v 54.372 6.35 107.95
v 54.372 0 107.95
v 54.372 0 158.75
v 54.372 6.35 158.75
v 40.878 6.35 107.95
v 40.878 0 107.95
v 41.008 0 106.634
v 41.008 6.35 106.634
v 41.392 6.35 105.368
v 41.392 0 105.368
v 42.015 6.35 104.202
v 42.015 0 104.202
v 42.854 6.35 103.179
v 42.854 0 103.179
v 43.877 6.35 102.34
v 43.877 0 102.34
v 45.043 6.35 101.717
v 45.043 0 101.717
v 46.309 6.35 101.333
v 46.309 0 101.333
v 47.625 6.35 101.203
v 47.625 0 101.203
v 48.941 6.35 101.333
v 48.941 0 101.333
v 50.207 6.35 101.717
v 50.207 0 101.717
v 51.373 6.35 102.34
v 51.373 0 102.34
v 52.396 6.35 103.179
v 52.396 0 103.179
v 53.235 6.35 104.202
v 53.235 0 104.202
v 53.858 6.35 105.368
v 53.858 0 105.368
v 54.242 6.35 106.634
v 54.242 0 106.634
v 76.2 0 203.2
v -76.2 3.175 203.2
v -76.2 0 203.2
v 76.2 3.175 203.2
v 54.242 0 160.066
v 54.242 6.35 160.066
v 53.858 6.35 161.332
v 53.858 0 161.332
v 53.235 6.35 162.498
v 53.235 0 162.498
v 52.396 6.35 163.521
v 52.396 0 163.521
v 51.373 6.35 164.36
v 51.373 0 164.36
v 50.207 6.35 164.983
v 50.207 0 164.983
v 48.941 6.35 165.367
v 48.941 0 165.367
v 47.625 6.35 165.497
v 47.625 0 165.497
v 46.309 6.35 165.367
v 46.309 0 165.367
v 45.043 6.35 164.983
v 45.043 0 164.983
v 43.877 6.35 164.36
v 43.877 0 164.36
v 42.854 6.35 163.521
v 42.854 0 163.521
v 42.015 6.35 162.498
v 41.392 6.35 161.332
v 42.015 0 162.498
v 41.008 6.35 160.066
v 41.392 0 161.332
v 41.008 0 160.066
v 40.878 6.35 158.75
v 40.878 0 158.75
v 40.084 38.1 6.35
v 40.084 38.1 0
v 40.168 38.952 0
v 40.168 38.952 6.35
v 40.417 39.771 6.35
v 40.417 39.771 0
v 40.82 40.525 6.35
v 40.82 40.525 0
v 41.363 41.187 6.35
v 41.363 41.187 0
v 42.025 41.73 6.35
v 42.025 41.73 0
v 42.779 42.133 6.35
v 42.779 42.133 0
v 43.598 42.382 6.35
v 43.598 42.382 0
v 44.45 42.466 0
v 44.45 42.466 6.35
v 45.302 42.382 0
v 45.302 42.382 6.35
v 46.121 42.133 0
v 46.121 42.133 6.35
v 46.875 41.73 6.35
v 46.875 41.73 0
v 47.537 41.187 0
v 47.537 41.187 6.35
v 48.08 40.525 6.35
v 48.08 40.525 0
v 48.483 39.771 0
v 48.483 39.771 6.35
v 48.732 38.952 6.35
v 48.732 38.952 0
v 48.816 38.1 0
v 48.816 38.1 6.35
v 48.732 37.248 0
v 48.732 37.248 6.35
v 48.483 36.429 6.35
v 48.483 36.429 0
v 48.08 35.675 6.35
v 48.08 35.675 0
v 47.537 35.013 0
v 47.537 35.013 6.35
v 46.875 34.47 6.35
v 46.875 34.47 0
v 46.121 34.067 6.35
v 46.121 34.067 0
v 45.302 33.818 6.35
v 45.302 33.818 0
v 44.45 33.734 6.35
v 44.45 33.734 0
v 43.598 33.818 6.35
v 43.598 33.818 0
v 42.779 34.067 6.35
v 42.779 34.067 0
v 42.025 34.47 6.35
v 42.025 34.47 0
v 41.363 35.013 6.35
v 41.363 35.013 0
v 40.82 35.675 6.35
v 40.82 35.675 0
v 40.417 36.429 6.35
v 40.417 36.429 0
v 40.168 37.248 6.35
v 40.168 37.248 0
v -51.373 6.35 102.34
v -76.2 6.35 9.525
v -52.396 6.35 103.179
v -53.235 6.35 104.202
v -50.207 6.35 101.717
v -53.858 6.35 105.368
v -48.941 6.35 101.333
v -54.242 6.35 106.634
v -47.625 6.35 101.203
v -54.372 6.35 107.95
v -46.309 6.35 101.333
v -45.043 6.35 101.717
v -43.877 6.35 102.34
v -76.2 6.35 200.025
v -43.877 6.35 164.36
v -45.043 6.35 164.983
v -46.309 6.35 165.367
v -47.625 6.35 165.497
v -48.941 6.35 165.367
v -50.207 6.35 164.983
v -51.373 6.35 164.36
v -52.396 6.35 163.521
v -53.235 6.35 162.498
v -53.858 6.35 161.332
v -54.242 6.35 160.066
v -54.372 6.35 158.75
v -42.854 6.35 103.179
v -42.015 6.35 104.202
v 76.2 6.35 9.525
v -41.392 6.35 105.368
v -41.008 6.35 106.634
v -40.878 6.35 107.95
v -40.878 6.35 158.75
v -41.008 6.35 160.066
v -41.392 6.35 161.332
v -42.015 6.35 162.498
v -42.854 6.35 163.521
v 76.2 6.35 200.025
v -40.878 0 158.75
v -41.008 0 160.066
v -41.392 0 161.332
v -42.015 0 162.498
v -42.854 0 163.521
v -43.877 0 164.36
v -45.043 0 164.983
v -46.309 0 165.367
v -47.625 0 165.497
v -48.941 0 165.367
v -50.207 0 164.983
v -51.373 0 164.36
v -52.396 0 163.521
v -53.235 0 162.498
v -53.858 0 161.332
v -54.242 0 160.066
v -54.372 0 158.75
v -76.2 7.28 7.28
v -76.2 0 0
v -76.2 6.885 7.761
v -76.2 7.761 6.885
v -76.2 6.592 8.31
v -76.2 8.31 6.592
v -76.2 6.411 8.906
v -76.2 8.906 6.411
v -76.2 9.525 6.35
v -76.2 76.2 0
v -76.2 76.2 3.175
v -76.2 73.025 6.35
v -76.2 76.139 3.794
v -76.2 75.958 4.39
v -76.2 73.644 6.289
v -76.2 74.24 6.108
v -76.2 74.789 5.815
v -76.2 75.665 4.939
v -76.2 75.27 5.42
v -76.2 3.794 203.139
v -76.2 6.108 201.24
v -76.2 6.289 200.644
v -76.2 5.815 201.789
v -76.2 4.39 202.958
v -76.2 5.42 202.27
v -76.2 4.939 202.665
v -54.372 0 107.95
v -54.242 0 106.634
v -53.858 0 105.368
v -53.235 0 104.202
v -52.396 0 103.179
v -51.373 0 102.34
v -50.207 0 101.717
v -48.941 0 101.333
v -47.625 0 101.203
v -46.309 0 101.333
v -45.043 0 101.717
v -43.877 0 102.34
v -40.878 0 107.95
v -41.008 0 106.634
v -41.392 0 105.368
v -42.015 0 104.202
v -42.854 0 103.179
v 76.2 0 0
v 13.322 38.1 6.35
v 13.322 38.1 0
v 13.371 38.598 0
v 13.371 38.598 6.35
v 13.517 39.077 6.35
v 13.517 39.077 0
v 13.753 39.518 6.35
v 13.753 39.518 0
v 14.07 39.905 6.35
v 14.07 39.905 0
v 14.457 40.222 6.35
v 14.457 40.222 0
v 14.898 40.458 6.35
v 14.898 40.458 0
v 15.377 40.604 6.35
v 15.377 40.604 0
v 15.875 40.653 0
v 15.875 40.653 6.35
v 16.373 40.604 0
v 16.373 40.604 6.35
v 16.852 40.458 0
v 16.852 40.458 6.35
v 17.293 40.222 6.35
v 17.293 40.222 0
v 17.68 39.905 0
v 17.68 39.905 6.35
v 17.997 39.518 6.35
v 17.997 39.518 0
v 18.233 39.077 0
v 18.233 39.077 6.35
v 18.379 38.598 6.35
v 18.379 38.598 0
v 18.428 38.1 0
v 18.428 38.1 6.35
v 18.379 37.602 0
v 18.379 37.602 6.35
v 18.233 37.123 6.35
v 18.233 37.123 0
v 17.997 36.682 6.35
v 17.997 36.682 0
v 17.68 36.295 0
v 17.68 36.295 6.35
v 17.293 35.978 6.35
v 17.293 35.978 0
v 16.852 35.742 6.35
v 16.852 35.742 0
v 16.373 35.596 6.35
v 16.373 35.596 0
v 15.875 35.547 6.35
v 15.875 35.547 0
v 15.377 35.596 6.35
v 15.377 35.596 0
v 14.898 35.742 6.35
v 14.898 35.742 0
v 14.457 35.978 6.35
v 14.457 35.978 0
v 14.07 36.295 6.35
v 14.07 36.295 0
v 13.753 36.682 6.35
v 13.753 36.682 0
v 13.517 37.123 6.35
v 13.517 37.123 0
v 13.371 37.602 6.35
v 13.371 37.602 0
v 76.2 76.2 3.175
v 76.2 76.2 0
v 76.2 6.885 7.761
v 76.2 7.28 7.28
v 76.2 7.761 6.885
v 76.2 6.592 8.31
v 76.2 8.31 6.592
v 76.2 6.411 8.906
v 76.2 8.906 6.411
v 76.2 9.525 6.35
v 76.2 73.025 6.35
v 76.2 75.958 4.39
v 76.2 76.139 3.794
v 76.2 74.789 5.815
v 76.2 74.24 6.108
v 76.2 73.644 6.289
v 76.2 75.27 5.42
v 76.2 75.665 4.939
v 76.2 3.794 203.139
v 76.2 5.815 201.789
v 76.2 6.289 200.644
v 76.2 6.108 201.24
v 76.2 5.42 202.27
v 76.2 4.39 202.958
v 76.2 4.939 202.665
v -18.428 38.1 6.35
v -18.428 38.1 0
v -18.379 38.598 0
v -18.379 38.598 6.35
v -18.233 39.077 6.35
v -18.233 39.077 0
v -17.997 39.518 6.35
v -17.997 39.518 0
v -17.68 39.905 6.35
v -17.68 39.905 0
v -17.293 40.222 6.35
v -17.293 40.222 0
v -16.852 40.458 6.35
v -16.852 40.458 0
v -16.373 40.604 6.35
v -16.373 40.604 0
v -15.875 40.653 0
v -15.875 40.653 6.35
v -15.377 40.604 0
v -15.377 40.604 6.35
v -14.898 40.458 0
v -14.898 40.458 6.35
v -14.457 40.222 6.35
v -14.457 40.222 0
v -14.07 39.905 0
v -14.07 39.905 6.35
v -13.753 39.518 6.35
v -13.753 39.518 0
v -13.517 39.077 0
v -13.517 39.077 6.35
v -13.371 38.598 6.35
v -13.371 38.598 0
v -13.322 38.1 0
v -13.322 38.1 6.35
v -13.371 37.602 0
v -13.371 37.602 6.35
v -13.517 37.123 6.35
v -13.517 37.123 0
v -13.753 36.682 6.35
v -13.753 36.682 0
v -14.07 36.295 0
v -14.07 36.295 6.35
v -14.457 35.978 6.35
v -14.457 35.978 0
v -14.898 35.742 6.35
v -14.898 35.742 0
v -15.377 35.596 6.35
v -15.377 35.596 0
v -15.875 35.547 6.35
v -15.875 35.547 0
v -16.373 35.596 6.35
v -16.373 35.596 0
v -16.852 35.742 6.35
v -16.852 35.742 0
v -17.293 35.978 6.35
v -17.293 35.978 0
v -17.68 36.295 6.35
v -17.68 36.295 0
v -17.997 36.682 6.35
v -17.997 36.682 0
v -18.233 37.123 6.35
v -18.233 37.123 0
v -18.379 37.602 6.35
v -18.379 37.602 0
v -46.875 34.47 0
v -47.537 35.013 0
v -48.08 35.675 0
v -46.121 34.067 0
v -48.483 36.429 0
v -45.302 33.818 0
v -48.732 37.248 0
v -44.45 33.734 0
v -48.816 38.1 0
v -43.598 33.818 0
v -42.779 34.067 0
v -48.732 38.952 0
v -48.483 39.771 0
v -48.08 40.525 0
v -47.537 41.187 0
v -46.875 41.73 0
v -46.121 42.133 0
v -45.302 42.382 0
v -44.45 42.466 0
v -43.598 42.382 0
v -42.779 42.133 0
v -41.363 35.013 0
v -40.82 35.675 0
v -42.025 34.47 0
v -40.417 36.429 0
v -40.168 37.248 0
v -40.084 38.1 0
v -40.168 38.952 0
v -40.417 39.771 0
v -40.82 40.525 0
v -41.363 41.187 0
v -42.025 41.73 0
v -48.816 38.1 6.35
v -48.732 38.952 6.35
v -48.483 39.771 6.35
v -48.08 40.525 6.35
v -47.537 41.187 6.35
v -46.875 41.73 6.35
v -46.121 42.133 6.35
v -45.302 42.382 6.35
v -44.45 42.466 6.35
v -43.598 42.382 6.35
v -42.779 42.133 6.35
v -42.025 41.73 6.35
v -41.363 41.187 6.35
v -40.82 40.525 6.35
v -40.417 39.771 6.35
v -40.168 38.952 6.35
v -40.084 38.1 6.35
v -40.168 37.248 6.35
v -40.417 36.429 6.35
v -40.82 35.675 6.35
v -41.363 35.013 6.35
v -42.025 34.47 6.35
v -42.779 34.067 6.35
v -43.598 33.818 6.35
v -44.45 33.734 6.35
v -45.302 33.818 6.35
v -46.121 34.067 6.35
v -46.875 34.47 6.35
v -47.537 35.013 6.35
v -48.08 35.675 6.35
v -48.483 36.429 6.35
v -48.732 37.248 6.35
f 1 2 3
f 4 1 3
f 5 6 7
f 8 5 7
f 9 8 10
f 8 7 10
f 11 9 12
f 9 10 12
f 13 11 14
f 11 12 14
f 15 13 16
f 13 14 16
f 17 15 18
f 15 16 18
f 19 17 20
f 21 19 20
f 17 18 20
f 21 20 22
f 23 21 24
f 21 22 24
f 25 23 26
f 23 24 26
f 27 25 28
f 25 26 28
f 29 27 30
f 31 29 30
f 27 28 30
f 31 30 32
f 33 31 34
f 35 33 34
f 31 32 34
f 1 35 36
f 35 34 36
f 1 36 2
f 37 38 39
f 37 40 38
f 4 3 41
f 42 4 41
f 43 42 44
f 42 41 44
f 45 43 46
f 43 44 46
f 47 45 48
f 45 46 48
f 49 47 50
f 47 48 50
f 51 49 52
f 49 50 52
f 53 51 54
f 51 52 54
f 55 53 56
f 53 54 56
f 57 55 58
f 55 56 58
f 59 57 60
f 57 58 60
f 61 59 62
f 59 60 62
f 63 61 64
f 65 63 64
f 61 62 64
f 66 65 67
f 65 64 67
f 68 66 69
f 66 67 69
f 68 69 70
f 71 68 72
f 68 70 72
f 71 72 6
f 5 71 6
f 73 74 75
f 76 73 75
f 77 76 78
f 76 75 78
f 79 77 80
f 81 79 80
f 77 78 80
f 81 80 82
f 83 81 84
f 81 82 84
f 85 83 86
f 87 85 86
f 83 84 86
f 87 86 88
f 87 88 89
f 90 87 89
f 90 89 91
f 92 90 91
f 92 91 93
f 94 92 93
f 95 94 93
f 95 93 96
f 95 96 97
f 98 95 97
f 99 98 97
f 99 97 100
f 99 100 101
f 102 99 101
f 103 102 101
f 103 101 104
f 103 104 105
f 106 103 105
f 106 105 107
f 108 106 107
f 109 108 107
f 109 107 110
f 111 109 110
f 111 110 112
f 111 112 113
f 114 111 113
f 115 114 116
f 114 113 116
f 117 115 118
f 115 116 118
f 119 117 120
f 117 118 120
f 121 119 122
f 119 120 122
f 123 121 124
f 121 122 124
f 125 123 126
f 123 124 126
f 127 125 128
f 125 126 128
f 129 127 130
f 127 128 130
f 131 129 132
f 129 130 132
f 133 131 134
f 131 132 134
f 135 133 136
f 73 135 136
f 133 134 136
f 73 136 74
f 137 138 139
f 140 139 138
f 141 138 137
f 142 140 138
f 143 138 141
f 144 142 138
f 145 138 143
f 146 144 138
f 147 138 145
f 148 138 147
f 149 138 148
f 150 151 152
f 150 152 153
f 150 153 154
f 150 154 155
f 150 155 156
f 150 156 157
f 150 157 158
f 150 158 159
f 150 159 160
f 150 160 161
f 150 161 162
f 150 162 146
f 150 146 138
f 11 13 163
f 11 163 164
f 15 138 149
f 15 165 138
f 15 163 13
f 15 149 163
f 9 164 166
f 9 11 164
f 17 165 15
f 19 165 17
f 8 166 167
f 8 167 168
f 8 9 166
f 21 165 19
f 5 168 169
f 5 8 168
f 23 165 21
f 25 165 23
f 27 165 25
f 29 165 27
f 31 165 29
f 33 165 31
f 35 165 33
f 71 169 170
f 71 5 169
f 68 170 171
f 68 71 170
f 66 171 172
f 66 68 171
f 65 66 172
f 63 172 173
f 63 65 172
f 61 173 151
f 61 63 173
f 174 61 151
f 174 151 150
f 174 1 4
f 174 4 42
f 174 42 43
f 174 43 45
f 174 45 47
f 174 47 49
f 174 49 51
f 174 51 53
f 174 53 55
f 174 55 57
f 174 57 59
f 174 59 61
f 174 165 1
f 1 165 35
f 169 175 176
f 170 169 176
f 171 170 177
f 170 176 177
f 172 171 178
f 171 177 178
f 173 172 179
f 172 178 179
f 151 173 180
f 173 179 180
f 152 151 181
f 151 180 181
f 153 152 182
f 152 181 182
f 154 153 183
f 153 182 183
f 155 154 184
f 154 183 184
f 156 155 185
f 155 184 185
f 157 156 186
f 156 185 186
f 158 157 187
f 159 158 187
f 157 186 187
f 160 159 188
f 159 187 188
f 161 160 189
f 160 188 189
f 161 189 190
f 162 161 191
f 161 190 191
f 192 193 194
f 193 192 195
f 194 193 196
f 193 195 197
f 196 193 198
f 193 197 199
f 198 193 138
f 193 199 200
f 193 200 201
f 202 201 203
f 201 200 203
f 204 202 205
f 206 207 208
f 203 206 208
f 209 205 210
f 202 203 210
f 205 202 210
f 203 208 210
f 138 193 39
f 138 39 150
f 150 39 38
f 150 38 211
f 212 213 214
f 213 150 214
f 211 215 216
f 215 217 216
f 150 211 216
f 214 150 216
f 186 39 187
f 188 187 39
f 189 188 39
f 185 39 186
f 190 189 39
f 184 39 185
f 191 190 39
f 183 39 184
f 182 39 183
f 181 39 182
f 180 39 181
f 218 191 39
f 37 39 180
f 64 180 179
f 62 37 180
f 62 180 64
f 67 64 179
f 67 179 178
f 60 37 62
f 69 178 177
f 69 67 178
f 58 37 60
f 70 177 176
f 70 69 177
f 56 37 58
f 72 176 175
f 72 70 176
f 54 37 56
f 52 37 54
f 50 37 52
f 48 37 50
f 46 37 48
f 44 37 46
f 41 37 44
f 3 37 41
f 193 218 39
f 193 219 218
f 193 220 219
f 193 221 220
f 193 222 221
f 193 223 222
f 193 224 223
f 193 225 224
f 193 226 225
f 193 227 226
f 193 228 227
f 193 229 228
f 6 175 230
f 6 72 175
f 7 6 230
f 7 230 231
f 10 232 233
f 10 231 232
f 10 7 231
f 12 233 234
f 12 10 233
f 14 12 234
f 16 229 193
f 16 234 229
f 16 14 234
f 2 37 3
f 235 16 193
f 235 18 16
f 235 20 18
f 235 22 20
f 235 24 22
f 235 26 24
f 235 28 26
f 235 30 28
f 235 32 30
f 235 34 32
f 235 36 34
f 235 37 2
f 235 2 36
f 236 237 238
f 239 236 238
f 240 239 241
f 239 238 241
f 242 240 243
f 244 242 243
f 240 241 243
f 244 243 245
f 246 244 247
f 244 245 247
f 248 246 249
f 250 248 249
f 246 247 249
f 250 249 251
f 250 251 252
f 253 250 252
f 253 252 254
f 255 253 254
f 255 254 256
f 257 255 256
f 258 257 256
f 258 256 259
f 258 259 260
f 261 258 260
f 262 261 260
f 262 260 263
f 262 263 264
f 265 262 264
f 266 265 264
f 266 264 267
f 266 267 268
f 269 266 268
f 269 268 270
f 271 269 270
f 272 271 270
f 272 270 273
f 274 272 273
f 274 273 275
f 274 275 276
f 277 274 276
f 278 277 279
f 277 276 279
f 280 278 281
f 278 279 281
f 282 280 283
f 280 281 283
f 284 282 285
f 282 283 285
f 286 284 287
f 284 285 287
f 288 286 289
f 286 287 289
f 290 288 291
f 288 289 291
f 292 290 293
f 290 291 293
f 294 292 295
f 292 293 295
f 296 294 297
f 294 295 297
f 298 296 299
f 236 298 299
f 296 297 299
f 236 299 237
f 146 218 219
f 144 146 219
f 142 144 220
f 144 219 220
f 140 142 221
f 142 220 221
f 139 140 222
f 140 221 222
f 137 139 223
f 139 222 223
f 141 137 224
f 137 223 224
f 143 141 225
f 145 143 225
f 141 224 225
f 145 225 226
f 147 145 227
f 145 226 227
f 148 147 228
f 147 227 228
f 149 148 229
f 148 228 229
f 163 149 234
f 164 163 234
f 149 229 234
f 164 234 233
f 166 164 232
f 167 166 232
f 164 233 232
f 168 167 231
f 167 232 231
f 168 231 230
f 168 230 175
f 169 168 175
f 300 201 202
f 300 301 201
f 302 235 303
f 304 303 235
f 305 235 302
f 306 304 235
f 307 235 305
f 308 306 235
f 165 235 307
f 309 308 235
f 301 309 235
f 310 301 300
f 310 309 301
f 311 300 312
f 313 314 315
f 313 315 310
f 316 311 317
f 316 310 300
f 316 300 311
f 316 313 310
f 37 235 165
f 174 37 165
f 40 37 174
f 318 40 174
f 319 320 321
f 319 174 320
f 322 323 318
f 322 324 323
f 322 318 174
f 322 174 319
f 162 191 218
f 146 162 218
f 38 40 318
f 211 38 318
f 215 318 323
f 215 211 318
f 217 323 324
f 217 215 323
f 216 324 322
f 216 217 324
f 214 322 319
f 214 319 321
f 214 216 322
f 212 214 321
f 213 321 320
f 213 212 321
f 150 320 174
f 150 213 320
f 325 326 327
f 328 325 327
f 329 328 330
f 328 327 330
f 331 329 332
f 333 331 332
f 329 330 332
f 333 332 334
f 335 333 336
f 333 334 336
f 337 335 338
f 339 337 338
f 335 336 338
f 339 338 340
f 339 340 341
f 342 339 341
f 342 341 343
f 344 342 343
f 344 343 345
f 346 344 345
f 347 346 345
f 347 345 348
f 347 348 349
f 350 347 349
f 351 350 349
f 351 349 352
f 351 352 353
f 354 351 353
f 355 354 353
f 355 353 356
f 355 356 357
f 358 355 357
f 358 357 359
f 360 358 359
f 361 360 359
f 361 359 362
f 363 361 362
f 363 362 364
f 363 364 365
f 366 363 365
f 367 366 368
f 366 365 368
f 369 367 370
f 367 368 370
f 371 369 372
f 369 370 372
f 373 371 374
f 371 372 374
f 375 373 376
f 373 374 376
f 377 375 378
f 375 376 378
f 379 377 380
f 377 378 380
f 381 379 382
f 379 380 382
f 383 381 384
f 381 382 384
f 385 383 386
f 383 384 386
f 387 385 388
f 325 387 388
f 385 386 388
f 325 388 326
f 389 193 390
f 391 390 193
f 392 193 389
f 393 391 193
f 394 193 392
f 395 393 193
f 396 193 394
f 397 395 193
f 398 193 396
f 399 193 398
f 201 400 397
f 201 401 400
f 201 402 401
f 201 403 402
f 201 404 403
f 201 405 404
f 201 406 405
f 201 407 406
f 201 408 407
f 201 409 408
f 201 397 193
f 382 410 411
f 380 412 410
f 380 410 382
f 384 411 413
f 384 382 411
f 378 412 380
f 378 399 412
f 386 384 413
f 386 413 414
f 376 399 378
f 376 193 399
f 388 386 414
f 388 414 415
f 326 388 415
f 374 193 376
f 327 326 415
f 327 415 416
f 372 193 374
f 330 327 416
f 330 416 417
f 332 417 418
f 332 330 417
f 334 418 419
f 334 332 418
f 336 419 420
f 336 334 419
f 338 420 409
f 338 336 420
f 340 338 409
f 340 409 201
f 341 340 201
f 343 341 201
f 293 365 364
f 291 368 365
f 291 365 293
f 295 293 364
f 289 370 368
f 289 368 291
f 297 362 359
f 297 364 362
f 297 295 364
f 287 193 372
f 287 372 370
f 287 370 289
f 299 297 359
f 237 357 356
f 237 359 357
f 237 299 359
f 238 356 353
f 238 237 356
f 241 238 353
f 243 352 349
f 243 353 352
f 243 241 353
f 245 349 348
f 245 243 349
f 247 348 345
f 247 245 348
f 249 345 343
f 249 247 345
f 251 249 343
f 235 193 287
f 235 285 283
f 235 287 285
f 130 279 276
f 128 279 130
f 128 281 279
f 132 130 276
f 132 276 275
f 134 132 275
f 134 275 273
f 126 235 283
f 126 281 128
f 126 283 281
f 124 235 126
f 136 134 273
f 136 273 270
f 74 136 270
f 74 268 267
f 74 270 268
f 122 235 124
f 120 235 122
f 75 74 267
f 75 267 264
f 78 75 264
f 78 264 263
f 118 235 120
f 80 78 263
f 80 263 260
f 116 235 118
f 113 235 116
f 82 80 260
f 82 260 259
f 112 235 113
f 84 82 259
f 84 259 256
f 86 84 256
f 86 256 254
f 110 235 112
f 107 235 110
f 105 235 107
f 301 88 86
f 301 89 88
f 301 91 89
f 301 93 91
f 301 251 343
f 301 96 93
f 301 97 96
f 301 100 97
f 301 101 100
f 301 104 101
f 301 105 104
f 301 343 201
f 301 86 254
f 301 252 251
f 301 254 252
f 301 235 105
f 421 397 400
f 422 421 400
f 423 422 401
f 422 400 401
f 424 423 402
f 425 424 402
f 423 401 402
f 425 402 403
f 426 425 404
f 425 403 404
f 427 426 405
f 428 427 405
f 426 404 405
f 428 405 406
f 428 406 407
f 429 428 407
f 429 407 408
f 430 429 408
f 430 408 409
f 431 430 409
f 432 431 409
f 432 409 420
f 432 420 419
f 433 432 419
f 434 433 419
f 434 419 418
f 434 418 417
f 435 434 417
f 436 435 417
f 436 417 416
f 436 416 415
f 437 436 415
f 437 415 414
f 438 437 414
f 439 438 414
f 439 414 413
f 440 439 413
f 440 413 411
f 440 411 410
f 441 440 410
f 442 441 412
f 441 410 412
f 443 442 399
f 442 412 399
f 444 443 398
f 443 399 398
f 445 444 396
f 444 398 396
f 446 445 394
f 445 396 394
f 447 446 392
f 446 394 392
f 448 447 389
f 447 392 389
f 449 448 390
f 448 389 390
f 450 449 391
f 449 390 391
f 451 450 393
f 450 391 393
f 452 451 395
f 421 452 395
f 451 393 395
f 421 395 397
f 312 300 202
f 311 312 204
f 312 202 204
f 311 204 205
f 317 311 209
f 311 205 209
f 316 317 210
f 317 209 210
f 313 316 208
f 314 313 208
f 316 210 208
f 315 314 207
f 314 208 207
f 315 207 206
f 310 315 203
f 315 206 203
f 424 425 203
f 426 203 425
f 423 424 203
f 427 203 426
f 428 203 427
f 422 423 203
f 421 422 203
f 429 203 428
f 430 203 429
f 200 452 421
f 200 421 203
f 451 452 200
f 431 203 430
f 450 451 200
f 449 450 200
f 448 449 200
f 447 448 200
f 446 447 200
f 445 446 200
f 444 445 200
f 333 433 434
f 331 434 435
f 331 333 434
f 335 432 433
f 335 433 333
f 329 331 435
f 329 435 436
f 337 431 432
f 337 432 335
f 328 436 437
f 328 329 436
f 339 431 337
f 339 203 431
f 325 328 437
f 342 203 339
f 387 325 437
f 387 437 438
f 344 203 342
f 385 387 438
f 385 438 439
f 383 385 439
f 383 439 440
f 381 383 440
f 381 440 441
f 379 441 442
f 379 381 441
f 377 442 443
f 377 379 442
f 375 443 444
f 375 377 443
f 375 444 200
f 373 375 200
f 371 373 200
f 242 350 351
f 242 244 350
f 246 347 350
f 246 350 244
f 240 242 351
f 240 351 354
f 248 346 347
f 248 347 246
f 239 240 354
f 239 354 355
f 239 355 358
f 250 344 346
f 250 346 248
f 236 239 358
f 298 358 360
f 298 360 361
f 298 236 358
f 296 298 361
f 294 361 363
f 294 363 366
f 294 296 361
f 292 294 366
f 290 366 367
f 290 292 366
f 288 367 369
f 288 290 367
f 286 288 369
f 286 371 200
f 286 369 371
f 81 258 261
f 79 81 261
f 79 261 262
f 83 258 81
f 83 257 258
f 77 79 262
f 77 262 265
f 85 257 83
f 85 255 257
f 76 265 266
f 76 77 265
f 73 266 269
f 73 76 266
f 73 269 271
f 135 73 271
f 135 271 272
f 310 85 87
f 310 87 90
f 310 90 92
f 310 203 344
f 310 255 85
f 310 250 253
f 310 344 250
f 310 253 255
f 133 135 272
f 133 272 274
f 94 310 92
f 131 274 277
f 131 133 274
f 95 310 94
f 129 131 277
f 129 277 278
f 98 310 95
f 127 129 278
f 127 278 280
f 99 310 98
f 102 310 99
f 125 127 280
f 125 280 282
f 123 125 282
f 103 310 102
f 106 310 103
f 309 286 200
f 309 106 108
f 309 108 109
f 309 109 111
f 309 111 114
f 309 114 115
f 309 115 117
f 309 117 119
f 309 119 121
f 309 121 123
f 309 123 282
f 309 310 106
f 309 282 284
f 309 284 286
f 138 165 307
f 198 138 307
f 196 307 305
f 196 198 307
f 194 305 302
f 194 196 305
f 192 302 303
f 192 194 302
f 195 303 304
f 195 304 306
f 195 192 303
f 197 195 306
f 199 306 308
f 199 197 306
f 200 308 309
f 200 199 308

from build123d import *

# Parameters (mm, degrees)
F1_DEPTH = 76.2
F3_DEPTH = 25.4
F5_D     = 8.73125
F7_D     = 5.1054
F8_R     = 3.175


with BuildPart() as f1:
    # F0 (on Right) → F1 (new body, symmetric)
    with BuildSketch(Plane.YZ):
        Polygon((6.3499999233, 203.2), (0, 203.2), (0, 0), (76.2, 0), (76.2, 6.3499999233), (6.3499999233, 6.3499999233), align=None)
    extrude(amount=F1_DEPTH, both=True)

    # F2 (on face) → F3 (cut)
    with BuildSketch(Plane.XZ):
        with BuildLine():
            ThreePointArc((-40.878125, 158.75), (-47.625, 165.496875), (-54.371875, 158.75))
            Line((-54.371875, 158.75), (-54.371875, 107.95))
            ThreePointArc((-54.371875, 107.95), (-47.625, 101.203125), (-40.878125, 107.95))
            Line((-40.878125, 107.95), (-40.878125, 158.75))
        make_face()
        with BuildLine():
            Line((54.371875, 107.95), (54.371875, 158.75))
            ThreePointArc((54.371875, 158.75), (47.625, 165.496875), (40.878125, 158.75))
            Line((40.878125, 158.75), (40.878125, 107.95))
            ThreePointArc((40.878125, 107.95), (47.625, 101.203125), (54.371875, 107.95))
        make_face()
    extrude(amount=-F3_DEPTH, mode=Mode.SUBTRACT)

    # F5 (through all)
    with Locations(Plane.XY.offset(6.3499999233)):
        with Locations((-44.45, 38.1), (44.45, 38.1)):
            Hole(F5_D / 2)

    # F7 (through all)
    with Locations(Plane.XY.offset(6.3499999233)):
        with Locations((15.875, 38.1), (-15.875, 38.1)):
            Hole(F7_D / 2)

    # F8
    f8_edges = [f1.edges().sort_by_distance(p)[0] for p in [
        (0, 6.35, 6.35),
        (0, 6.35, 203.2),
        (0, 76.2, 6.35),
    ]]
    fillet(f8_edges, radius=F8_R)


solid = f1.part
